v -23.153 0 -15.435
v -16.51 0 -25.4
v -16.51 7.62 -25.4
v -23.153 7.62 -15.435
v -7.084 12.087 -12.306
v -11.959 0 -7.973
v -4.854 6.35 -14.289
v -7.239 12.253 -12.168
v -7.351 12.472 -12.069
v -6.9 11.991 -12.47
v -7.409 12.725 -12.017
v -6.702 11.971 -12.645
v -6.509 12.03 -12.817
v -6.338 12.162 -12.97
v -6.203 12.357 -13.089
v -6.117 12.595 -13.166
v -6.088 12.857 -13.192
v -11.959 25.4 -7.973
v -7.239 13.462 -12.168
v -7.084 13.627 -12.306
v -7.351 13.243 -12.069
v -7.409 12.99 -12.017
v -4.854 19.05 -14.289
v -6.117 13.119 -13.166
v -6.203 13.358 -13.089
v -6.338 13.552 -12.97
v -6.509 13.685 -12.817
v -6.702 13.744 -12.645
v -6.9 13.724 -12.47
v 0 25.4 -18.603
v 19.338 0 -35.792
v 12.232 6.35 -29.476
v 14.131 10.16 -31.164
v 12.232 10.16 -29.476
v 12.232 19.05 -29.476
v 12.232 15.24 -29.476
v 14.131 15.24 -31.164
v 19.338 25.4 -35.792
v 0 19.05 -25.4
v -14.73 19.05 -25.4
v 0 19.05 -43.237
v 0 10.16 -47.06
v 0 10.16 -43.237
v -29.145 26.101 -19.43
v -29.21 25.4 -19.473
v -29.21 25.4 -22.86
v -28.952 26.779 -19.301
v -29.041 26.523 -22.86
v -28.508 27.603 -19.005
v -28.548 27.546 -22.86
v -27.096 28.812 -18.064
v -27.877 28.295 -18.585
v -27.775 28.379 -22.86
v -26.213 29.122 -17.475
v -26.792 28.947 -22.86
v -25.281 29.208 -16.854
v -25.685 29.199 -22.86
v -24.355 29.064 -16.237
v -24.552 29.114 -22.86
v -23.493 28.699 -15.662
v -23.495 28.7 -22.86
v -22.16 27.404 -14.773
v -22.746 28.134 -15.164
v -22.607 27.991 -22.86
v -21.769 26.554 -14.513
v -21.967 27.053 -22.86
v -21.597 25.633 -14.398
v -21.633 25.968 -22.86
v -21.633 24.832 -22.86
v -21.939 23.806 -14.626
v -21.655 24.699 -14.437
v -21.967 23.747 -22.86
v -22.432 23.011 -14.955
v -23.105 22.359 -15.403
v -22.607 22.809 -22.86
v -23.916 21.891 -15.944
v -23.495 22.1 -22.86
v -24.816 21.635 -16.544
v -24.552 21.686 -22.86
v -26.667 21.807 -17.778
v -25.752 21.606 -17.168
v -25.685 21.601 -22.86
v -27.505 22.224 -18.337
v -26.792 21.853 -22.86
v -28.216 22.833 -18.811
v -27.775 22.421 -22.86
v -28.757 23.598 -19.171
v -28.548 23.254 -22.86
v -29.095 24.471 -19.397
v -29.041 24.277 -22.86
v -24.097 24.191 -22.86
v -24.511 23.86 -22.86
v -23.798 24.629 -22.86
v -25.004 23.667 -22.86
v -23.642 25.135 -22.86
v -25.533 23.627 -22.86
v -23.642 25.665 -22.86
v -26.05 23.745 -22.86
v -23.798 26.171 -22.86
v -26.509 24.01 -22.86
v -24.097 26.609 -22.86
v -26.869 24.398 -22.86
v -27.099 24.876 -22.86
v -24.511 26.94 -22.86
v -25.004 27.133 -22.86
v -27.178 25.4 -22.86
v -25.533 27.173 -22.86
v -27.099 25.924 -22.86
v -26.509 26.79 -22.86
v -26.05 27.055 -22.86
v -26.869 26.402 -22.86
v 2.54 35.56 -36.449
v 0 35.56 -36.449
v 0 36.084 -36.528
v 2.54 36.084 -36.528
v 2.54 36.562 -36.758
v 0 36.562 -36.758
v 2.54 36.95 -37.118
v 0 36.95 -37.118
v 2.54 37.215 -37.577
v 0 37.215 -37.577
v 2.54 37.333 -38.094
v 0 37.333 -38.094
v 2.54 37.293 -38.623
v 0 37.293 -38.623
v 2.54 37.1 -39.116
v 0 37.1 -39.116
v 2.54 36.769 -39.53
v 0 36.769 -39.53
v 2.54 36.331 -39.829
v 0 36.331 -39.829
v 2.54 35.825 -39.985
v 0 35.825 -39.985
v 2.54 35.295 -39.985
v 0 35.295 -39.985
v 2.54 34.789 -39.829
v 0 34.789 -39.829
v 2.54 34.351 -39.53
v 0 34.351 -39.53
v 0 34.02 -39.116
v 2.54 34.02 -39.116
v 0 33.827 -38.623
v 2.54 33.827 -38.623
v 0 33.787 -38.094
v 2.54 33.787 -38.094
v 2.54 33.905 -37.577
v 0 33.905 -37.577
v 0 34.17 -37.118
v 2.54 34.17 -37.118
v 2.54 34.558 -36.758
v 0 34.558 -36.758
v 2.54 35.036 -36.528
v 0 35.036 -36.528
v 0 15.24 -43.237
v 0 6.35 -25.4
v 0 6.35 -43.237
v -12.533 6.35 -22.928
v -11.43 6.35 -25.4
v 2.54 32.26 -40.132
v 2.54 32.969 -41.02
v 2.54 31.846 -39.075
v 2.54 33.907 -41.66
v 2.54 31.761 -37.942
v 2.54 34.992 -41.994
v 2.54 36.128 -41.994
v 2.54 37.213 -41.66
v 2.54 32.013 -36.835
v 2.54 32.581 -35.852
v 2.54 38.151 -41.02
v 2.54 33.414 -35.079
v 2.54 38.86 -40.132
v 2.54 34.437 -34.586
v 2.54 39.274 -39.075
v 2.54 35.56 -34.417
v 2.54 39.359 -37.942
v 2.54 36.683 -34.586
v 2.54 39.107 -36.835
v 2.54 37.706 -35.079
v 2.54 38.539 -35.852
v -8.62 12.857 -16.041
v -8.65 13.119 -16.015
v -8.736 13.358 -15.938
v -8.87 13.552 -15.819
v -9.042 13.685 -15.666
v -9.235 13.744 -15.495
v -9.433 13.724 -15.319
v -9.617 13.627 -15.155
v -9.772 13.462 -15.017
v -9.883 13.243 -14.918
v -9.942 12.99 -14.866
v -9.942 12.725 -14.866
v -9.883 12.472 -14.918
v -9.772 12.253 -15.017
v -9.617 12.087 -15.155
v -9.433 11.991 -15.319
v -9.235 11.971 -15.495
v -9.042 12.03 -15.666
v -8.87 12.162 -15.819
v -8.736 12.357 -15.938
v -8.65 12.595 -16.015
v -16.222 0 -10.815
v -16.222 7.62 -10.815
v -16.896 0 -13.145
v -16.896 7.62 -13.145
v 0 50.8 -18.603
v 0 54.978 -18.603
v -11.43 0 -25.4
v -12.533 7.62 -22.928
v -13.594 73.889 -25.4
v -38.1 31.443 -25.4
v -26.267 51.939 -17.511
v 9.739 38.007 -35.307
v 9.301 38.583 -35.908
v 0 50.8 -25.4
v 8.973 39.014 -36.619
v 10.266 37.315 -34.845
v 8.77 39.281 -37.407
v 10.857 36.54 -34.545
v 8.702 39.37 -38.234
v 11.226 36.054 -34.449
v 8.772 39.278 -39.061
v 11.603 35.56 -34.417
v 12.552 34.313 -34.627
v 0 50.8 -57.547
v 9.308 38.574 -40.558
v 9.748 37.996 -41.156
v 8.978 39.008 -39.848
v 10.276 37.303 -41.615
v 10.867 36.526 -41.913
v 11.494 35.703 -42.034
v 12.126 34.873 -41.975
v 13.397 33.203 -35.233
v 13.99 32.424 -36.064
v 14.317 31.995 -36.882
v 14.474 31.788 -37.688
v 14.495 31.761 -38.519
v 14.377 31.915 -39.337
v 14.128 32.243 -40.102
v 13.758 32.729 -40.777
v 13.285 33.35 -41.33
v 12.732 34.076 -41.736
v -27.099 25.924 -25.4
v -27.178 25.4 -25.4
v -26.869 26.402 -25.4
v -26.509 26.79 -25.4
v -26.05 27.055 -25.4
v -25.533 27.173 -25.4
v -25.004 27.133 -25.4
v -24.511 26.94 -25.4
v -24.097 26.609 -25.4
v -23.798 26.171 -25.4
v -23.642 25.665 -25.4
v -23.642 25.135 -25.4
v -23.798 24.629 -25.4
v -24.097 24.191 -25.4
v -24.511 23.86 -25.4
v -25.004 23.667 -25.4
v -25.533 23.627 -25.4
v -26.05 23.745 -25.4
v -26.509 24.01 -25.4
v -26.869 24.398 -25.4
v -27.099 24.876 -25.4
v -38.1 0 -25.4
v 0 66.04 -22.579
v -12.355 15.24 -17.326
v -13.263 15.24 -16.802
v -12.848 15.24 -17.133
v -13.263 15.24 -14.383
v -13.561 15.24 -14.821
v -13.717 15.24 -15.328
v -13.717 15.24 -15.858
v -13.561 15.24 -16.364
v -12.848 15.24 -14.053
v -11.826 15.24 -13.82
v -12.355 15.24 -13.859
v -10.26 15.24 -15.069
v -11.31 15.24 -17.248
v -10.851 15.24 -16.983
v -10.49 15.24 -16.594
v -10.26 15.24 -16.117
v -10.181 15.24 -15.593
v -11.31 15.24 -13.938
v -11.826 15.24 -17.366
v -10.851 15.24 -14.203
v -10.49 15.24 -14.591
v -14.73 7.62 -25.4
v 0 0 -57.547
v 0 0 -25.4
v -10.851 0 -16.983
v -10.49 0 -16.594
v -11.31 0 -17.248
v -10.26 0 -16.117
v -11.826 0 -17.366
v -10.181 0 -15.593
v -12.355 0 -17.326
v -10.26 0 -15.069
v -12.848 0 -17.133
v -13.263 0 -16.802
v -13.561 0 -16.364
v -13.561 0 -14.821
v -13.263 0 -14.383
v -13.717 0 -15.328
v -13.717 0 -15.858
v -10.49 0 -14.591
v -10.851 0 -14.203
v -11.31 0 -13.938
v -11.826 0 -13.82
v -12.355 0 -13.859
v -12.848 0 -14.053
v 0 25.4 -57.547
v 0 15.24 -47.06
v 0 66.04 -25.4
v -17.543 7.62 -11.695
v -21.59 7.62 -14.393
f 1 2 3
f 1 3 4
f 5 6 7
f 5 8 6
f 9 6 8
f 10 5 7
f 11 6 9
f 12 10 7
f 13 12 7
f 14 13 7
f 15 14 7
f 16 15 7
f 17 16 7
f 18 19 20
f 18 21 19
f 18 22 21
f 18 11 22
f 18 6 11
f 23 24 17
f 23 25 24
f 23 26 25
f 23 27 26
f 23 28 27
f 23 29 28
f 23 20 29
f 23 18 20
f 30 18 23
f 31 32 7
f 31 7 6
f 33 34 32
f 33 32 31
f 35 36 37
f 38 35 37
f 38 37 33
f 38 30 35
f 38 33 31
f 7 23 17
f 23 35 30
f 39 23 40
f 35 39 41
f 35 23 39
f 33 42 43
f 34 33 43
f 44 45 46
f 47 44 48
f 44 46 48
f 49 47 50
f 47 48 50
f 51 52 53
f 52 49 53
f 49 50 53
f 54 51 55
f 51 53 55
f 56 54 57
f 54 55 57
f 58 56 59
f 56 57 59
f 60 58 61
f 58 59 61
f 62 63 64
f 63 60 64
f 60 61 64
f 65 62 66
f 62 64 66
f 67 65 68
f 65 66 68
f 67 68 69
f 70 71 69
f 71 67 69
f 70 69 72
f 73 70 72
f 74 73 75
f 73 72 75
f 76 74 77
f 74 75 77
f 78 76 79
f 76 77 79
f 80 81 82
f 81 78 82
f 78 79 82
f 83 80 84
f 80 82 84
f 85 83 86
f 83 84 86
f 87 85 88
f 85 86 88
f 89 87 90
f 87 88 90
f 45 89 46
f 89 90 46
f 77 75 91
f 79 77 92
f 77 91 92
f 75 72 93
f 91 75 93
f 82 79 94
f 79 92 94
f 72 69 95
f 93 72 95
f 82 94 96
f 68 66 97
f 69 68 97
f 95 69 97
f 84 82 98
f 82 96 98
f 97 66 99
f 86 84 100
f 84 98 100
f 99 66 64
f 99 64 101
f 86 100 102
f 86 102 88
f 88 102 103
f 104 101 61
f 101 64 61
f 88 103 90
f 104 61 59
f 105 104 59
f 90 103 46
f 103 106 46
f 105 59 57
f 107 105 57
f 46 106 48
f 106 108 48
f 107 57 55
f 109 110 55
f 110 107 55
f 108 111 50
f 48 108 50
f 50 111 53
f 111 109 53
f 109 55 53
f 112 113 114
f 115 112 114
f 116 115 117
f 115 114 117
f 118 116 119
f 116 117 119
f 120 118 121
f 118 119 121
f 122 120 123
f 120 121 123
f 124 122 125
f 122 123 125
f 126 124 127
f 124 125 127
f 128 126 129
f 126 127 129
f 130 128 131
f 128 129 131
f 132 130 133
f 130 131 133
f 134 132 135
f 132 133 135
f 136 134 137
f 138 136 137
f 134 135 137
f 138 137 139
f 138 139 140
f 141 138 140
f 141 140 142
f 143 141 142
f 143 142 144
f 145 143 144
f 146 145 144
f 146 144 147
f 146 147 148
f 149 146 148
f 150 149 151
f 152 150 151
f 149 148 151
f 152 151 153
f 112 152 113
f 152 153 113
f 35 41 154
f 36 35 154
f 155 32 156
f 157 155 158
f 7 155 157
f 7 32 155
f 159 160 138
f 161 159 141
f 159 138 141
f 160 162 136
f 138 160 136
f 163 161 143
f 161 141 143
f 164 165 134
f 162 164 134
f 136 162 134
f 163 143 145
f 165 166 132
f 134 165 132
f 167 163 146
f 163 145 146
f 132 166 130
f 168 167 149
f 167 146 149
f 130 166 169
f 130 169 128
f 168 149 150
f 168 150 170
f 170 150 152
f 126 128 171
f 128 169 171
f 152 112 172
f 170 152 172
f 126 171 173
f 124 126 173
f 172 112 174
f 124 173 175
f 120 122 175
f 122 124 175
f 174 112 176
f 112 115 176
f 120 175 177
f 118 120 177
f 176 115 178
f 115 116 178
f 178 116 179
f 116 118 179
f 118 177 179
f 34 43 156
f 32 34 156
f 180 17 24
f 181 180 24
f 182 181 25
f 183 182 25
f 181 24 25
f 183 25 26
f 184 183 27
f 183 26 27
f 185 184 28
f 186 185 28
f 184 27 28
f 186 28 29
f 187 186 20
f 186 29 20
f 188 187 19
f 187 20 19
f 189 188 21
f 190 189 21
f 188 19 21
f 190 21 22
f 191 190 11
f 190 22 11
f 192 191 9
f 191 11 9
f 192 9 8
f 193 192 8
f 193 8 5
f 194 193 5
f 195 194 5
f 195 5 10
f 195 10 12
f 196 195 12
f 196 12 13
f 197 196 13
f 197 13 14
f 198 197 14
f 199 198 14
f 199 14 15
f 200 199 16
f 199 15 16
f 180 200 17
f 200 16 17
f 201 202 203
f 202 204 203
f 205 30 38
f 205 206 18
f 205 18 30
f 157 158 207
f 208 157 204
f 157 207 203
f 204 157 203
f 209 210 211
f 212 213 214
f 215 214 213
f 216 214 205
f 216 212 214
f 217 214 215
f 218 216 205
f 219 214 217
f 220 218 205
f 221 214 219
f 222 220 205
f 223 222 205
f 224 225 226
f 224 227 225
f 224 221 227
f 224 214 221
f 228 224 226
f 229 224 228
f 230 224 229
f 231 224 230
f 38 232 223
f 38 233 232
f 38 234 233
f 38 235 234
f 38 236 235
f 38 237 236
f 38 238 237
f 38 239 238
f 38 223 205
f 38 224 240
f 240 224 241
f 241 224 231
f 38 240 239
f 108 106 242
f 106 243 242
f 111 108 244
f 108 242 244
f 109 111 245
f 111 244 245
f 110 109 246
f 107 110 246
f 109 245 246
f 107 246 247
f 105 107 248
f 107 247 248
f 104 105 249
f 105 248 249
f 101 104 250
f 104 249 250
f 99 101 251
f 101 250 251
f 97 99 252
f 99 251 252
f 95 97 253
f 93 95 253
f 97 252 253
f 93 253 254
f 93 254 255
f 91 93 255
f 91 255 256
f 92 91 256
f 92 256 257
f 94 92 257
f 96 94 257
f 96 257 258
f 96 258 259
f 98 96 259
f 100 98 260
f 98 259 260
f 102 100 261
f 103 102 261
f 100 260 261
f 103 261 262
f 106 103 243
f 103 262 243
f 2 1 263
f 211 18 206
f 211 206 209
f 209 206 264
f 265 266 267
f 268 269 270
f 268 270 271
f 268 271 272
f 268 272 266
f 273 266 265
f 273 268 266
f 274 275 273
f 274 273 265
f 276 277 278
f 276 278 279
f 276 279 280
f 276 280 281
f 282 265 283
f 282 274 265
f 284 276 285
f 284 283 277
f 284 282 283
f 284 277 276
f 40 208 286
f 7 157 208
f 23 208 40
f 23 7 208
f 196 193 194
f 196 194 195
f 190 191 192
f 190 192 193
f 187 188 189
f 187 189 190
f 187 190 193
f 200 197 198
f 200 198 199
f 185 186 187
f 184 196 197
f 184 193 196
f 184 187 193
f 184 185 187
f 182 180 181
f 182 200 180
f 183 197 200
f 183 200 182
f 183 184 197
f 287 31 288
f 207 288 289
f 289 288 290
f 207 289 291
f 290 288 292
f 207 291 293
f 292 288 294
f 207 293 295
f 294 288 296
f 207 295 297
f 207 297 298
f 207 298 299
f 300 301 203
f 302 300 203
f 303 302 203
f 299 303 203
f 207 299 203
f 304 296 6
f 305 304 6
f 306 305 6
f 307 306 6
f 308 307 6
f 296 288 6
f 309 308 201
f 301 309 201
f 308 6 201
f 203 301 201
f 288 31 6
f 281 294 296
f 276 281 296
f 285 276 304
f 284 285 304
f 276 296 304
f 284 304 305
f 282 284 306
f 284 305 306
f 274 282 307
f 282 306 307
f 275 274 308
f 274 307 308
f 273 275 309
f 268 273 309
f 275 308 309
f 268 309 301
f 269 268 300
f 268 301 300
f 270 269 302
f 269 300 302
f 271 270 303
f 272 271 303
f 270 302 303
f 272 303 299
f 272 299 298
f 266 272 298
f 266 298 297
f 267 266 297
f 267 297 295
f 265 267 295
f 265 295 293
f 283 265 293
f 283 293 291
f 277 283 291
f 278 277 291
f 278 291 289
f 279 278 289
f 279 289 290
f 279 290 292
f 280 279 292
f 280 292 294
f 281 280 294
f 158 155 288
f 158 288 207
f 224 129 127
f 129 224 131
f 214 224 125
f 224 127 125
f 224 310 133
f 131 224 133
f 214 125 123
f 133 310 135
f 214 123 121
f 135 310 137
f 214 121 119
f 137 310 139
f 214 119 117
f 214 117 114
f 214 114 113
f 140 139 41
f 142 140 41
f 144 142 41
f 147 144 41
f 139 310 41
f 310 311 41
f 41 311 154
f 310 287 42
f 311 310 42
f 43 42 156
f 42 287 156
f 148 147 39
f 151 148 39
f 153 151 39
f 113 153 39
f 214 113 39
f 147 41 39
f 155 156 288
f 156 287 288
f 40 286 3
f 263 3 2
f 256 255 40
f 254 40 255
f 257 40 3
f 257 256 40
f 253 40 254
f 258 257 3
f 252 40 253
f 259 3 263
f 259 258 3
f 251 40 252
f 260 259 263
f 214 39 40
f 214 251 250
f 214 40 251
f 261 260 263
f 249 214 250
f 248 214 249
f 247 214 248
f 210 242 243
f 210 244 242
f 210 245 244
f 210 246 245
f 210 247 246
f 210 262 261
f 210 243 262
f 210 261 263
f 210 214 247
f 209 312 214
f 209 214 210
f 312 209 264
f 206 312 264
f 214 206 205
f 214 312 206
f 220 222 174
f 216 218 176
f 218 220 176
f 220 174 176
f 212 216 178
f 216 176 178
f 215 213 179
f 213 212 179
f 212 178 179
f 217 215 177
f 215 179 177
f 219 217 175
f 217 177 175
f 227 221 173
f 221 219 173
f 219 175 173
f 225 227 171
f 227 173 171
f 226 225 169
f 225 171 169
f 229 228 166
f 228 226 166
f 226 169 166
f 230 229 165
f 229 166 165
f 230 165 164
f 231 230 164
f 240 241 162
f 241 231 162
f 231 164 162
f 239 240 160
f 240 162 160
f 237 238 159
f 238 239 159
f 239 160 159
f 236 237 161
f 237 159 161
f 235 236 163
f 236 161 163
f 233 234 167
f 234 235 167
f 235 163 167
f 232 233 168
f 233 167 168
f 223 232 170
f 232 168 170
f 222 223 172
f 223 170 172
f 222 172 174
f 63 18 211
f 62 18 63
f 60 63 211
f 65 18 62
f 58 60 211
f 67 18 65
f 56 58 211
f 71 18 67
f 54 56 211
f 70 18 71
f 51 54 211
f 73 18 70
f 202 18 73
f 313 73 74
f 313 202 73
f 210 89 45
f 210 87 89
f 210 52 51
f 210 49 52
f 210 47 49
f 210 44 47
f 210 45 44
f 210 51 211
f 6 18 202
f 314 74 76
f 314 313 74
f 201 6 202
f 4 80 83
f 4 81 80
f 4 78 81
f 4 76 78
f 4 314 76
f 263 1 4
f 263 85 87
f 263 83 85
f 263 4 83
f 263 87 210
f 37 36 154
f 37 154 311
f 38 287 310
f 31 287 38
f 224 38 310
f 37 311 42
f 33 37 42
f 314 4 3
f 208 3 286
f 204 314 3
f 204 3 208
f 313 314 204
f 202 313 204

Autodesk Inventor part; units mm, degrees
ref_plane "YZ Plane" through (0, 0, 0) normal (1, 0, 0) x (0, 1, 0)
ref_plane "XZ Plane" through (0, 0, 0) normal (0, 1, 0) x (-1, 0, 0)
ref_plane "XY Plane" through (0, 0, 0) normal (0, 0, 1) x (1, 0, 0)
sketch "Sketch1" plane through (0, 0, 0) normal (0, 1, 0) x (-1, 0, 0)
  line L0 (0, 0) -> (38.1, -25.4)
  line L1 (38.1, -25.4) -> (0, -25.4)
  line L2 (0, -25.4) -> (0, -57.5469)
  line L3 (0, -57.5469) -> (-28.575, -25.4)
  line L4 (-28.575, -25.4) -> (0, 0)
  dimension "d0" = 38.1
  dimension "d2" = 25.4
  dimension "d3" = 28.575
extrude "Extrusion1" add sketch "Sketch1" along normal blind 25.4
sketch "Sketch2" plane through (0, 25.4, 0) normal (0, 1, 0) x (1, 0, 0)
  line L0 (-38.1, 25.4) -> (0, 0) projected
  line L1 (-11.9592, 7.9728) -> (19.3376, 35.7921)
  line L2 (0, 0) -> (28.575, 25.4) projected
  line L3 (28.575, 25.4) -> (0, 57.5469) projected
  point P0 (0, 25.4)
  dimension "d6" = 5.08
extrude "Extrusion2" cut sketch "Sketch2" against normal blind 49.2125
sketch "Sketch3" plane through (19.3376, 0, -35.7921) normal (0.6643638, 0, 0.7474093) x (0.7474093, 0, -0.6643638)
  line L0 (-32.3668, 19.05) -> (-9.5068, 19.05)
  line L1 (-9.5068, 19.05) -> (-9.5068, 6.35)
  line L2 (-9.5068, 6.35) -> (-32.3668, 6.35)
  line L3 (-32.3668, 6.35) -> (-32.3668, 19.05)
  line L4 (0, 25.4) -> (0, 0) projected
  line L5 (-41.8736, 25.4) -> (0, 25.4) projected
  point P0 (-38.2321, 0)
  point P1 (-9.5068, 12.7)
  point P2 (0, 12.7)
  point P3 (-20.9368, 19.05)
  point P4 (-20.9368, 25.4)
  dimension "d9" = 12.7
  dimension "d10" = 22.86
extrude "Extrusion3" cut sketch "Sketch3" against normal blind 82.55
sketch "Sketch4" plane through (19.3376, 0, -35.7921) normal (0.6643638, 0, 0.7474093) x (0.7474093, 0, -0.6643638)
  point P0 (-38.2321, 0)
sketch "Sketch5" plane through (19.3376, 0, -35.7921) normal (0.6643638, 0, 0.7474093) x (0.7474093, 0, -0.6643638)
  line L0 (-9.5068, 6.35) -> (-9.5068, 19.05) projected
  line L1 (-9.5068, 15.24) -> (-6.9668, 15.24)
  line L2 (-6.9668, 15.24) -> (-6.9668, 10.16)
  line L3 (-6.9668, 10.16) -> (-9.5068, 10.16)
  line L4 (-9.5068, 10.16) -> (-9.5068, 15.24)
  point P0 (-38.2321, 0)
  point P1 (-6.9668, 12.7)
  point P2 (-9.5068, 12.7)
  dimension "d13" = 2.54
  dimension "d14" = 5.08
extrude "Extrusion4" cut sketch "Sketch5" against normal blind 36.5125
sketch "Sketch7" plane through (0, 0, -25.4) normal (0, 0, -1) x (-1, 0, 0)
  line L0 (0, 25.4) -> (38.1, 25.4) projected
  line L1 (38.1, 0) -> (38.1, 31.4433) projected
  line L2 (38.1, 31.4433) -> (13.5942, 73.8886) projected
  line L3 (0, 66.04) -> (0, 19.05) projected
  line L4 (13.5942, 73.8886) -> (0, 66.04) projected
  point P0 (0, 0)
extrude "Extrusion6" add sketch "Sketch7" against normal blind 20.6375
sketch "Sketch8" plane through (-38.1, 25.4, -4.7625) normal (0, -1, 0) x (1, 0, 0)
  line L0 (0, -20.6375) -> (26.1408, -3.2103) projected
  line L1 (26.1408, -3.2103) -> (38.1, -13.8407) projected
  line L2 (38.1, -13.8407) -> (38.1, 0) projected
  line L3 (0, 0) -> (38.1, 0) projected
  line L4 (0, -20.6375) -> (0, 0) projected
  point P0 (38.1, 4.7625)
extrude "Extrusion7" cut sketch "Sketch8" against normal blind 74.6125
sketch "Sketch9" plane through (0, 25.4, -25.4) normal (1, 0, 0) x (0, 0, -1)
  line L0 (0, 0) -> (-6.7968, 0) projected
  line L1 (-17.4272, -25.4) -> (-17.4272, 47.5446) projected
  line L2 (0, 0) -> (-17.4272, 0)
  line L3 (-17.4272, 0) -> (0, 48.4886)
  line L4 (0, 48.4886) -> (-17.4272, 48.4886)
  line L5 (-17.4272, 48.4886) -> (-17.4272, 0)
  point P0 (-25.4, -25.4)
extrude "Extrusion8" cut sketch "Sketch9" against normal blind 92.075
sketch "Sketch10" plane through (0, 25.4, 0) normal (0, 1, 0) x (1, 0, 0)
  line L0 (0, 25.4) -> (0, 18.6032) projected
  line L1 (0, 18.6032) -> (19.3376, 35.7921) projected
  line L2 (19.3376, 35.7921) -> (0, 57.5469) projected
  line L3 (0, 57.5469) -> (0, 25.4) projected
  line L4 (5.08, 51.054) -> (5.08, 24.93) projected
  line L5 (5.08, 24.93) -> (5.08, 23.1187) projected
  line L6 (5.08, 52.3795) -> (5.08, 51.054) projected
  point P0 (0, 0)
extrude "Extrusion9" add sketch "Sketch10" along normal blind 25.4
ref_plane "Work Plane1" through (0, -6.35, -128.016) normal (0, 0, -1) x (0, 1, 0)
sketch "Sketch11" plane through (0, -6.35, -128.016) normal (0, 0, -1) x (0, 1, 0)
  line L0 (57.15, 19.3376) -> (57.15, 0) projected
  line L1 (57.15, 0) -> (31.75, 19.3376)
  line L2 (57.15, 19.3376) -> (6.35, 19.3376) projected
  line L3 (31.75, 19.3376) -> (57.15, 19.3376)
  line L4 (57.15, 19.3376) -> (57.15, 0)
  point P0 (6.35, 0)
  dimension "d27" = 25.4
extrude "Extrusion10" cut sketch "Sketch11" against normal blind 209.55
sketch "Sketch12" plane through (0, 0, -57.5469) normal (-1, 0, 0) x (0, 0, 1)
  circle A0 centre (19.3199, 35.56) radius 1.778
  line L0 (6.4929, 66.04) -> (6.4929, 0) projected
  line L1 (0, 50.8) -> (32.1469, 50.8) projected
  point P0 (57.5469, 0)
  dimension "d30" = 3.556
  dimension "d31" = 12.827
  dimension "d32" = 15.24
extrude "Extrusion11" cut sketch "Sketch12" against normal blind 209.55
ref_plane "Work Plane2" through (2.54, 0, -57.5469) normal (-1, 0, 0) x (0, 0, 1)
sketch "Sketch13" plane through (2.54, 0, -57.5469) normal (-1, 0, 0) x (0, 0, 1)
  circle A0 centre (19.3199, 35.56) radius 1.778 projected
  circle A1 centre (19.3199, 35.56) radius 3.81
  point P0 (57.5469, 0)
  dimension "d36" = 7.62
extrude "Extrusion12" cut sketch "Sketch13" against normal blind 209.55 contours A0 | A1
sketch "Sketch14" plane through (0, 0, -25.4) normal (0, 0, -1) x (-1, 0, 0)
  circle A0 centre (25.4, 25.4) radius 1.778
  line L0 (38.1, 0) -> (38.1, 31.4433) projected
  line L1 (0, 0) -> (38.1, 0) projected
  dimension "d39" = 3.556
  dimension "d40" = 12.7
  dimension "d41" = 25.4
extrude "Extrusion13" cut sketch "Sketch14" against normal blind 115.8875
ref_plane "Work Plane3" through (0, 0, -22.86) normal (0, 0, -1) x (-1, 0, 0)
sketch "Sketch15" plane through (0, 0, -22.86) normal (0, 0, -1) x (-1, 0, 0)
  circle A0 centre (25.4, 25.4) radius 1.778 projected
  circle A1 centre (25.4, 25.4) radius 3.81
  point P0 (0, 0)
  dimension "d45" = 7.62
extrude "Extrusion14" cut sketch "Sketch15" against normal blind 115.8875
sketch "Sketch16" plane through (0, 0, 0) normal (0, -1, 0) x (1, 0, 0)
  circle A0 centre (-11.9592, -15.5928) radius 1.778 projected
  point P0 (0, 0)
extrude "Extrusion15" cut sketch "Sketch16" against normal blind 15.24
sketch "Sketch17" plane through (-11.9592, 0, -7.9728) normal (0.6643638, 0, 0.7474093) x (0.7474093, 0, -0.6643638)
  circle A0 centre (6.9668, 12.8573) radius 0.889
  circle A1 centre (34.9068, 12.8573) radius 0.889
  line L0 (32.3668, 6.35) -> (9.5068, 6.35) projected
  point P0 (3.6416, 0)
  point P1 (20.9368, 6.35)
  dimension "d50" = 27.94
  dimension "d51" = 1.778
  dimension "d52" = 1.778
  dimension "d53" = 13.97
extrude "Extrusion16" cut sketch "Sketch17" against normal blind 3.81 contours A0
sketch "Sketch19" plane through (0, 0, 0) normal (0, -1, 0) x (1, 0, 0)
  line L0 (-16.51, -25.4) -> (-14.7303, -25.4) projected
  line L1 (-16.51, -25.4) -> (-23.1531, -15.4354)
  line L2 (-29.21, -19.4733) -> (-21.59, -14.3933) projected
  line L3 (-11.43, -25.4) -> (-17.5429, -11.6953)
  line L4 (-11.9592, -7.9728) -> (-26.2667, -17.5112) projected
  line L5 (0, -25.4) -> (-38.1, -25.4) projected
  point P0 (0, 0)
extrude "Extrusion18" cut sketch "Sketch19" against normal blind 7.62
chamfer "Chamfer1" distance 1.5875 angle 45 1 edges at (-17.5429, 3.81, -11.6953)
equation "\"d53\" = 0.5 * d50"
properties part number "Thumb Base2"
